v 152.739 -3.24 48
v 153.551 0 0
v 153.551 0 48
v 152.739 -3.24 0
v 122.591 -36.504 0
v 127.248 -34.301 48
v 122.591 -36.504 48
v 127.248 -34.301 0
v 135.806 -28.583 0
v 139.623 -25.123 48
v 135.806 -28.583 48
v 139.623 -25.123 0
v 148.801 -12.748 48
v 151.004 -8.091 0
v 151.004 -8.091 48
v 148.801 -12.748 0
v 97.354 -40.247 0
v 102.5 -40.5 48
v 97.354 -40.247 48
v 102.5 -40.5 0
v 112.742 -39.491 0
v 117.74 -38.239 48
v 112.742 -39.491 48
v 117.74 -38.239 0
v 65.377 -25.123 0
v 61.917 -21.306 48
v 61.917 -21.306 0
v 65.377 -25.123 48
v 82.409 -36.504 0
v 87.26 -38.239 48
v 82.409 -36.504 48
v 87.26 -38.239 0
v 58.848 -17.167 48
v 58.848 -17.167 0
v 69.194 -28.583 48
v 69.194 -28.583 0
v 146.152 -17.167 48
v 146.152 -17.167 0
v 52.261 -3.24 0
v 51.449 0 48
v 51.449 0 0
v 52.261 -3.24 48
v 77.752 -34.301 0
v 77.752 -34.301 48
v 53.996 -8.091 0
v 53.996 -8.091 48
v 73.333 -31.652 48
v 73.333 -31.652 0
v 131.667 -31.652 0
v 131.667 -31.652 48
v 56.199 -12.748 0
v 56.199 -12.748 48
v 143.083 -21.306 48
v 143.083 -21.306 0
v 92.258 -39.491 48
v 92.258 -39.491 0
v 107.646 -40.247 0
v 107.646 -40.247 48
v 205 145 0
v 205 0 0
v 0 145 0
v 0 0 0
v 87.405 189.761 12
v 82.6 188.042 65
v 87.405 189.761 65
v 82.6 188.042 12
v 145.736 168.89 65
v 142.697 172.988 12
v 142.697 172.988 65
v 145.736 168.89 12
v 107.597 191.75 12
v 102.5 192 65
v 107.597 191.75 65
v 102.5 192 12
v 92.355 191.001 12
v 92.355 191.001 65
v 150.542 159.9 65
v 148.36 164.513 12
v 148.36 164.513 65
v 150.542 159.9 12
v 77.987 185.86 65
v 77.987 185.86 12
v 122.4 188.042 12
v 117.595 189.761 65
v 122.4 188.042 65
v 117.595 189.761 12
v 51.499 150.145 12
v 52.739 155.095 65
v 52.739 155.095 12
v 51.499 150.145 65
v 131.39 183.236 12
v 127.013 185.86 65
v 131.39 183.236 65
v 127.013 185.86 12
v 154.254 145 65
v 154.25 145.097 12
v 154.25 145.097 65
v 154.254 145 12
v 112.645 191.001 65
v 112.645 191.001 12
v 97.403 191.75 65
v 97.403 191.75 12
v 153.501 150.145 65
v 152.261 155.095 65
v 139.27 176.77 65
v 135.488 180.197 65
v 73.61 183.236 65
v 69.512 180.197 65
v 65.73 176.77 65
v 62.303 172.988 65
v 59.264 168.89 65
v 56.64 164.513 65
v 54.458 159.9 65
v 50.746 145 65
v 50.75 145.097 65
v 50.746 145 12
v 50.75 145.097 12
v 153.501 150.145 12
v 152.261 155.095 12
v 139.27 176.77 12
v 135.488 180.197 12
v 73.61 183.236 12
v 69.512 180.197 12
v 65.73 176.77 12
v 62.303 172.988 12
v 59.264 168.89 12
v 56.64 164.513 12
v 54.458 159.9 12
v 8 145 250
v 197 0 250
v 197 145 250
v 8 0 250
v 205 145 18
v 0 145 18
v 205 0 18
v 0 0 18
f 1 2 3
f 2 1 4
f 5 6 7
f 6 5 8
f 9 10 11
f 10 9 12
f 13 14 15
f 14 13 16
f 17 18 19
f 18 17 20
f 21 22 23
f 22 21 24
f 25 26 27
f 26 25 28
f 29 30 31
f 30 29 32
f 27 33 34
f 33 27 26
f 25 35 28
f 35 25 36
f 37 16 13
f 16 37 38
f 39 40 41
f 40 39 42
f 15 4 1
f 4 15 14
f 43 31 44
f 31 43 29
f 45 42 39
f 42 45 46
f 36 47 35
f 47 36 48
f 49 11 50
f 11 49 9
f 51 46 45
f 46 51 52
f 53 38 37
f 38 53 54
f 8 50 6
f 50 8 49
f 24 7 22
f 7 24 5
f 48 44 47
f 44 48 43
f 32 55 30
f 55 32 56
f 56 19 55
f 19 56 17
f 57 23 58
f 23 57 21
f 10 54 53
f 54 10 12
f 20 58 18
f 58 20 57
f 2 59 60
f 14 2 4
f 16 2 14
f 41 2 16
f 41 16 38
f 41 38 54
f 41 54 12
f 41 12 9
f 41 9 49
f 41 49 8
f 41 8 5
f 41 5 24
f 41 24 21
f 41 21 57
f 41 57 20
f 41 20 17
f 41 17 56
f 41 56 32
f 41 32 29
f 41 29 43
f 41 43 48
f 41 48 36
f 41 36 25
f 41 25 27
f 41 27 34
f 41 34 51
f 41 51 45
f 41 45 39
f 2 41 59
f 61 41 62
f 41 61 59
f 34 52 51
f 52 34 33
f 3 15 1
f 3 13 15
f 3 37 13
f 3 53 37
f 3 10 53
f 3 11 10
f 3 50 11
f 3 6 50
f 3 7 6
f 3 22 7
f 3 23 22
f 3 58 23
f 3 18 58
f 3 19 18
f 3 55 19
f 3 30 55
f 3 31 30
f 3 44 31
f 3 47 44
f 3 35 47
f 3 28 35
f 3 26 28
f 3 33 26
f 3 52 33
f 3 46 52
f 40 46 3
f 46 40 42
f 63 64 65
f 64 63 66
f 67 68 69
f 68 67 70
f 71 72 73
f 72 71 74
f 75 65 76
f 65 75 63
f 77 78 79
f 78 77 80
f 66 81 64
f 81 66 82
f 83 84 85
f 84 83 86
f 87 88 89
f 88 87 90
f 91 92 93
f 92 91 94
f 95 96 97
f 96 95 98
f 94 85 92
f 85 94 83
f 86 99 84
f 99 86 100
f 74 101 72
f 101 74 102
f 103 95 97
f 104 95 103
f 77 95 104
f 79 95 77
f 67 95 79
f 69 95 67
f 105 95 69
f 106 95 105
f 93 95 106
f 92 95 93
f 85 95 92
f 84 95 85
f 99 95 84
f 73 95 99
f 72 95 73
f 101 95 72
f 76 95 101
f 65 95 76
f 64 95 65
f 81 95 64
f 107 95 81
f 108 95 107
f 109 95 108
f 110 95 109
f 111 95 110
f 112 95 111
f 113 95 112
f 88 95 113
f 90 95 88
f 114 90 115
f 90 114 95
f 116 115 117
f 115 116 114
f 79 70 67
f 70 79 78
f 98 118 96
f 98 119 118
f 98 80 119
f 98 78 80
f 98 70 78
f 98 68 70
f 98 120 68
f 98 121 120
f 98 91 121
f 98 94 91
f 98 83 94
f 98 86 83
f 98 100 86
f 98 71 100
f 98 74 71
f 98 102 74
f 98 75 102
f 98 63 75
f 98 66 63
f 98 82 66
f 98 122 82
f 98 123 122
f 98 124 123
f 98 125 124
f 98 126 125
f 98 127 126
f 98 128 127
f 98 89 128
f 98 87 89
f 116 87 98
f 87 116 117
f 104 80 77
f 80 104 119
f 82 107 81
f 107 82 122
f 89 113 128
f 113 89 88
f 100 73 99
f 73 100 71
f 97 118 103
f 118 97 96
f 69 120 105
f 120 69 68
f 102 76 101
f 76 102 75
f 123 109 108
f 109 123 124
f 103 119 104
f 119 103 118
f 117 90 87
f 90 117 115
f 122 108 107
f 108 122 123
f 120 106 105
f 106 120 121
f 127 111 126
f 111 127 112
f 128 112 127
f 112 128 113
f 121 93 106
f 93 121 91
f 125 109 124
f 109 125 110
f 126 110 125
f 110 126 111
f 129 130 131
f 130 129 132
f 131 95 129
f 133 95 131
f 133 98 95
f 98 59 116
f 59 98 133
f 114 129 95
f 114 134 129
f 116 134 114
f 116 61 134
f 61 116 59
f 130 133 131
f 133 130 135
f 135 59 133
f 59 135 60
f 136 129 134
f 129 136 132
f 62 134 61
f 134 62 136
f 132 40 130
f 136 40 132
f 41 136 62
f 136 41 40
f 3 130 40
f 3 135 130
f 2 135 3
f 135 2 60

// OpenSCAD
// file: parametros.scad
// Prisma v0.2 — todas las cotas en mm
outer_w=205; outer_h=250; outer_d=145;

// Waveshare — provisionales
screen_w=164.9;
screen_h=124.27;
screen_t=8;
screen_angle=18;
screen_cable_channel=18;

// Pi 5
pi_w=85; pi_d=58; pi_h=18;

// KABD-250 — provisionales
kabd_w=91.4; kabd_d=68.6; kabd_h=23;

// Audio
speaker_d=105; speaker_depth=48;
pr_d=104; pr_depth=53;

// Bloques provisionales
dac_w=45; dac_d=35; dac_h=15;
buck_w=60; buck_d=35; buck_h=20;

acoustic_target_l=3.5;

show_envelope=true;
show_screen=true;
show_electronics=true;
show_audio=true;
// main file
include <parametros.scad>;
$fn=64;

// Prisma — volumétrico v0.2
// Maqueta de distribución, no carcasa final.

module envelope(){
    color([0.7,0.7,0.7,0.18])
    hull(){
        cube([outer_w,outer_d,18]);
        translate([8,0,outer_h-18])
            cube([outer_w-16,outer_d,18]);
    }
}

module screen(){
    color([0.08,0.08,0.08])
        cube([screen_w,screen_t,screen_h]);
    // PCB posterior aproximada
    color([0.05,0.3,0.08])
        translate([0,screen_t,8])
            cube([screen_w,6,screen_h-16]);
    // zona provisional de conectores
    color([0.85,0.55,0.1])
        translate([screen_w-18,screen_t+6,screen_h*0.30])
            cube([18,18,35]);
}

module pi5(){ color([0.1,0.3,0.1]) cube([pi_w,pi_d,pi_h]); }
module kabd(){ color([0.2,0.2,0.22]) cube([kabd_w,kabd_d,kabd_h]); }
module dac(){ color([0.25,0.35,0.55]) cube([dac_w,dac_d,dac_h]); }
module buck(){ color([0.55,0.35,0.1]) cube([buck_w,buck_d,buck_h]); }

module speaker(){
    color([0.18,0.18,0.18])
    rotate([90,0,0]) cylinder(d=speaker_d,h=speaker_depth);
}
module pr(){
    color([0.22,0.22,0.22])
    rotate([90,0,0]) cylinder(d=pr_d,h=pr_depth);
}

// Pantalla
if(show_screen)
translate([(outer_w-screen_w)/2,10,outer_h-145])
rotate([-screen_angle,0,0]) screen();

// Altavoz frontal inferior
if(show_audio)
translate([outer_w/2,12,48]) rotate([90,0,0]) speaker();

// Radiador trasero
if(show_audio)
translate([outer_w/2,outer_d-5,65]) rotate([90,0,0]) pr();

// Electrónica
if(show_electronics){
    translate([15,62,outer_h-55]) pi5();
    translate([105,62,outer_h-55]) kabd();
    translate([105,105,outer_h-55]) dac();
    translate([25,105,outer_h-58]) buck();
}

if(show_envelope) envelope();
